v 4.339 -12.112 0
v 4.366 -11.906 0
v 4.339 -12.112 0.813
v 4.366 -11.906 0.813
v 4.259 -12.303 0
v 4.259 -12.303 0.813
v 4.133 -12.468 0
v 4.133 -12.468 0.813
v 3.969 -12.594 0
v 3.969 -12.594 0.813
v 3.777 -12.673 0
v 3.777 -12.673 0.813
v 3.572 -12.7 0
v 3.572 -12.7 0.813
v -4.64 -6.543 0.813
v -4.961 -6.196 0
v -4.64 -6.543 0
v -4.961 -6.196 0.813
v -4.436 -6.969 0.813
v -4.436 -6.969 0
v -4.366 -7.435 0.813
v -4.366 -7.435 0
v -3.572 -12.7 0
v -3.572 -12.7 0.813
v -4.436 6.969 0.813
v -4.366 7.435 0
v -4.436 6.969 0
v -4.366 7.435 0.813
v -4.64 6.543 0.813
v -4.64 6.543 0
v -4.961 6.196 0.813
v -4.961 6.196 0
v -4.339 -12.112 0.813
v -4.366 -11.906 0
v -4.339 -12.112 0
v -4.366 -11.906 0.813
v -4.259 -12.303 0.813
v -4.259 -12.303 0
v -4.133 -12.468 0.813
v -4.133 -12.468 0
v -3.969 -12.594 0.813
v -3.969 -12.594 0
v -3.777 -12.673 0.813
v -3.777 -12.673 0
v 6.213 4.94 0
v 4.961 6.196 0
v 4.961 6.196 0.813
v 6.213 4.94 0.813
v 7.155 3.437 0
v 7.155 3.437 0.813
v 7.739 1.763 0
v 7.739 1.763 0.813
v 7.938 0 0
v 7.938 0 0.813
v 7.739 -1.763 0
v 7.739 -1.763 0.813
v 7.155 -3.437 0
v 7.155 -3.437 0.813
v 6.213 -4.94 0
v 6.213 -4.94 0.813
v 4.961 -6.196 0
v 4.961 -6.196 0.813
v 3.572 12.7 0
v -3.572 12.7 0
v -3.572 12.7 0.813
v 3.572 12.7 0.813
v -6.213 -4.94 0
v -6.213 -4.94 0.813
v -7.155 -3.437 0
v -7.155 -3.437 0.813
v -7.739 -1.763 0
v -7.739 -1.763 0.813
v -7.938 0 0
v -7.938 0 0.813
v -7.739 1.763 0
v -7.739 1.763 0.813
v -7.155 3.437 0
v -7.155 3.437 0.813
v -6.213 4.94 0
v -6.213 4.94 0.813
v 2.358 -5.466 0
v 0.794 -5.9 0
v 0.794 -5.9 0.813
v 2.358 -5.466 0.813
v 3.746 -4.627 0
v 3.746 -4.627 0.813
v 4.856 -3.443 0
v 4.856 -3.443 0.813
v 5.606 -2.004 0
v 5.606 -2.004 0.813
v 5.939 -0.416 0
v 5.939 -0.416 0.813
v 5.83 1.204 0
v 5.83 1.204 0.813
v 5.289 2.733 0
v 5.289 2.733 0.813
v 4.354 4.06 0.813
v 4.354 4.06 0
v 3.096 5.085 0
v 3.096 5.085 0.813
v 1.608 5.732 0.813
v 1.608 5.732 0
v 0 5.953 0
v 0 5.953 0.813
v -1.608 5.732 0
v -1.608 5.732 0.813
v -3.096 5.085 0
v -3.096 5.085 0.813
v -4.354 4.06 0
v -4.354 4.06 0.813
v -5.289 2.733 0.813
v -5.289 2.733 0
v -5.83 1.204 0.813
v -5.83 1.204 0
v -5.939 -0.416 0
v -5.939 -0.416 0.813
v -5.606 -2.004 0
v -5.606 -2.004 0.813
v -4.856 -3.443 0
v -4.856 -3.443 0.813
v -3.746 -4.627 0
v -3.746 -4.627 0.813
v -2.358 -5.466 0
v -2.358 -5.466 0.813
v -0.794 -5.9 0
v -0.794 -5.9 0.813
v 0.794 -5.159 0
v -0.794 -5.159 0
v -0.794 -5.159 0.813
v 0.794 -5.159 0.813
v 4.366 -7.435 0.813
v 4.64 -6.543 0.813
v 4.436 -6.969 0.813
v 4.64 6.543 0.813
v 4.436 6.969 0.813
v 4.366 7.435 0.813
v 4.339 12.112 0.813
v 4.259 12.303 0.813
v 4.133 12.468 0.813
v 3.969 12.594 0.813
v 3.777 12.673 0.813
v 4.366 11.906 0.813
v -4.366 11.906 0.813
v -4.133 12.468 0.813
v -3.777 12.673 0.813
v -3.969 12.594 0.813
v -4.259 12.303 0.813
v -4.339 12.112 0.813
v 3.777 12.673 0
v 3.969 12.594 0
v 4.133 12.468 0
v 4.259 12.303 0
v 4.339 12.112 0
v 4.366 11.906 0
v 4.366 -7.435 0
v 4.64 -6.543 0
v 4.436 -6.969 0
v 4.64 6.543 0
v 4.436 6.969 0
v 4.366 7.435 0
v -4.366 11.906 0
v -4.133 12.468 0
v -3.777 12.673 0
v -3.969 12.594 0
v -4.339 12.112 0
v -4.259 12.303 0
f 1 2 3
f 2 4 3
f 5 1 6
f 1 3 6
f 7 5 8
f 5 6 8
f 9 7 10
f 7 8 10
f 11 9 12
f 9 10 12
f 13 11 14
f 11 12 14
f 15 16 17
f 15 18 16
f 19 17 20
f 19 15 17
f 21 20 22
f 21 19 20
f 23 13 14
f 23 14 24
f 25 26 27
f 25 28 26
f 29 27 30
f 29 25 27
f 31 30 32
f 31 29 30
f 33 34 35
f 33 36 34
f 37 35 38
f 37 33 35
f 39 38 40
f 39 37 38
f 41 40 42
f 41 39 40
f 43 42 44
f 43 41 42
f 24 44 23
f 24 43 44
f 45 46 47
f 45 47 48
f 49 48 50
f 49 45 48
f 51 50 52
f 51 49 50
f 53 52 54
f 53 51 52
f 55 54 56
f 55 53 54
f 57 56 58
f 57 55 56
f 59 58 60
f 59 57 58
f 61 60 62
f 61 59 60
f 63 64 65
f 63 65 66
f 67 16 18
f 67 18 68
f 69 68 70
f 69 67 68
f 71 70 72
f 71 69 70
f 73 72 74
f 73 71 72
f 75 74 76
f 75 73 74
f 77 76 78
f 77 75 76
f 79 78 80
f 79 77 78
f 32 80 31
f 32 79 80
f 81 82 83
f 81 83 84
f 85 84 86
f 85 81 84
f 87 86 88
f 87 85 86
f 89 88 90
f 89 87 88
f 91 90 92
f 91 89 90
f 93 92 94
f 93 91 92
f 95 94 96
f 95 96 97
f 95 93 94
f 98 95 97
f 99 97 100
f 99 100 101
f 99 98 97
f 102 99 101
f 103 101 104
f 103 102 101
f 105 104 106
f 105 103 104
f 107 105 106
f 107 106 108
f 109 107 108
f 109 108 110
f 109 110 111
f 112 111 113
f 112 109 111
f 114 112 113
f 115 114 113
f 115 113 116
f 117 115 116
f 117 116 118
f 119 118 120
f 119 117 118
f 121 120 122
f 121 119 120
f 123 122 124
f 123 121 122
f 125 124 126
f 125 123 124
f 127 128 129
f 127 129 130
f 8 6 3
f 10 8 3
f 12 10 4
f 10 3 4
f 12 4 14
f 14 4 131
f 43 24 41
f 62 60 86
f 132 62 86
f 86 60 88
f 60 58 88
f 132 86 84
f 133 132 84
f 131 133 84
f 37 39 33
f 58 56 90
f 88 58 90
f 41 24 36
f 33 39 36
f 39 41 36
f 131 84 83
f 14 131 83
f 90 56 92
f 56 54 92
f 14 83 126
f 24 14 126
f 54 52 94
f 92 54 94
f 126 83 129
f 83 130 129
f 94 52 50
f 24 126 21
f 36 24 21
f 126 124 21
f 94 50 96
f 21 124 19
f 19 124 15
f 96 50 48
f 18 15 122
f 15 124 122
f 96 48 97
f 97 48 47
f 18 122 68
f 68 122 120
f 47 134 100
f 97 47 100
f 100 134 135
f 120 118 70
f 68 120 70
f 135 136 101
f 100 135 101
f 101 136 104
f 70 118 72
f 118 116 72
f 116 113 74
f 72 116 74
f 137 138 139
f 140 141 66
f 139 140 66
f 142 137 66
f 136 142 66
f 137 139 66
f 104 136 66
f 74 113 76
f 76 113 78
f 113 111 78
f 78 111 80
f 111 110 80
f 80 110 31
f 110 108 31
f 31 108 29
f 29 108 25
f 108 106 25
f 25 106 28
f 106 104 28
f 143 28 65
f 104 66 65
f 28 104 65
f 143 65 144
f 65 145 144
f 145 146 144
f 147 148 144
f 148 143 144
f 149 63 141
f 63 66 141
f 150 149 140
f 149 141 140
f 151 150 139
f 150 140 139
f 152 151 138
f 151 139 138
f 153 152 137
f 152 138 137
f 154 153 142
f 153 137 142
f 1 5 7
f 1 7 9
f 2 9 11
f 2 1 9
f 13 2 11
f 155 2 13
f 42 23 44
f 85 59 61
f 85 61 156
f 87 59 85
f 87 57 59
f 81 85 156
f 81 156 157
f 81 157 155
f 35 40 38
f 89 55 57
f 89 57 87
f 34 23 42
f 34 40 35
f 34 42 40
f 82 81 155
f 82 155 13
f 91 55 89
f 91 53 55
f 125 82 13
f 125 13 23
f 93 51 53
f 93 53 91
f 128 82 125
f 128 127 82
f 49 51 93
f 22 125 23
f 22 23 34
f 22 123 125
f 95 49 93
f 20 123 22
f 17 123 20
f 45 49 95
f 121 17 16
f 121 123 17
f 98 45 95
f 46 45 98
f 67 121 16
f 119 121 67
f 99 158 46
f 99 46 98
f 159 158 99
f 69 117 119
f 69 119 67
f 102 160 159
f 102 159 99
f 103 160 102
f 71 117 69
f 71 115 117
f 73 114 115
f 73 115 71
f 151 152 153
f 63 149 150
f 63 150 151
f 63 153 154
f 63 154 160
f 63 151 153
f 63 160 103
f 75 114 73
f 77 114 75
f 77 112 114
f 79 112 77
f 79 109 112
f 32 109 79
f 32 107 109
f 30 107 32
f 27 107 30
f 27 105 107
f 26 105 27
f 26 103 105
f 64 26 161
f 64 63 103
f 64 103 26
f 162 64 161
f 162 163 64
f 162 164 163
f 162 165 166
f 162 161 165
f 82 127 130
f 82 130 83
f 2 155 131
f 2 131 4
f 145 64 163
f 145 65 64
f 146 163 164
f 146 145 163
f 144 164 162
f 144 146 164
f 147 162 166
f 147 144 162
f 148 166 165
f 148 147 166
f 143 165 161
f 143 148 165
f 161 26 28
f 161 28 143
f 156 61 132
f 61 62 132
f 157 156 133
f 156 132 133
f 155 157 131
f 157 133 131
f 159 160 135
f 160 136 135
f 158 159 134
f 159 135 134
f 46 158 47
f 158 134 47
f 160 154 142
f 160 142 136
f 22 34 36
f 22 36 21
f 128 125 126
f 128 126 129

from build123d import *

# Parameters (mm, degrees)
BOSS_EXTRUDE1_DEPTH = 0.8128
FILLET1_R           = 0.79375
FILLET2_R           = 1.5875


with BuildPart() as part:
    # Sketch1 → Boss-Extrude1 (new body)
    with BuildSketch(Plane.XY):
        with BuildLine():
            Line((-4.365625, 12.7), (4.365625, 12.7))
            Line((4.365625, 12.7), (4.365625, 6.629119444))
            ThreePointArc((4.365625, 6.629119444), (7.9375, 0), (4.365625, -6.629119444))
            Line((4.365625, -6.629119444), (4.365625, -12.7))
            Line((4.365625, -12.7), (-4.365625, -12.7))
            Line((-4.365625, -12.7), (-4.365625, -6.629119444))
            ThreePointArc((-4.365625, -6.629119444), (-7.9375, 0), (-4.365625, 6.629119444))
            Line((-4.365625, 6.629119444), (-4.365625, 12.7))
        make_face()
        with BuildLine():
            Line((-0.79375, -5.899971034), (-0.79375, -5.159375))
            Line((-0.79375, -5.159375), (0.79375, -5.159375))
            Line((0.79375, -5.159375), (0.79375, -5.899971034))
            ThreePointArc((0.79375, -5.899971034), (0, 5.953125), (-0.79375, -5.899971034))
        make_face(mode=Mode.SUBTRACT)
    extrude(amount=BOSS_EXTRUDE1_DEPTH)

    # Fillet1
    fillet1_edges = [part.edges().sort_by_distance(p)[0] for p in [
        (-4.365625, 12.7, 0.4064),
        (4.365625, 12.7, 0.4064),
        (4.365625, -12.7, 0.4064),
        (-4.365625, -12.7, 0.4064),
    ]]
    fillet(fillet1_edges, radius=FILLET1_R)

    # Fillet2
    fillet2_edges = [part.edges().sort_by_distance(p)[0] for p in [
        (4.365625, 6.629119444, 0.4064),
        (4.365625, -6.629119444, 0.4064),
        (-4.365625, -6.629119444, 0.4064),
        (-4.365625, 6.629119444, 0.4064),
    ]]
    fillet(fillet2_edges, radius=FILLET2_R)


solid = part.part
